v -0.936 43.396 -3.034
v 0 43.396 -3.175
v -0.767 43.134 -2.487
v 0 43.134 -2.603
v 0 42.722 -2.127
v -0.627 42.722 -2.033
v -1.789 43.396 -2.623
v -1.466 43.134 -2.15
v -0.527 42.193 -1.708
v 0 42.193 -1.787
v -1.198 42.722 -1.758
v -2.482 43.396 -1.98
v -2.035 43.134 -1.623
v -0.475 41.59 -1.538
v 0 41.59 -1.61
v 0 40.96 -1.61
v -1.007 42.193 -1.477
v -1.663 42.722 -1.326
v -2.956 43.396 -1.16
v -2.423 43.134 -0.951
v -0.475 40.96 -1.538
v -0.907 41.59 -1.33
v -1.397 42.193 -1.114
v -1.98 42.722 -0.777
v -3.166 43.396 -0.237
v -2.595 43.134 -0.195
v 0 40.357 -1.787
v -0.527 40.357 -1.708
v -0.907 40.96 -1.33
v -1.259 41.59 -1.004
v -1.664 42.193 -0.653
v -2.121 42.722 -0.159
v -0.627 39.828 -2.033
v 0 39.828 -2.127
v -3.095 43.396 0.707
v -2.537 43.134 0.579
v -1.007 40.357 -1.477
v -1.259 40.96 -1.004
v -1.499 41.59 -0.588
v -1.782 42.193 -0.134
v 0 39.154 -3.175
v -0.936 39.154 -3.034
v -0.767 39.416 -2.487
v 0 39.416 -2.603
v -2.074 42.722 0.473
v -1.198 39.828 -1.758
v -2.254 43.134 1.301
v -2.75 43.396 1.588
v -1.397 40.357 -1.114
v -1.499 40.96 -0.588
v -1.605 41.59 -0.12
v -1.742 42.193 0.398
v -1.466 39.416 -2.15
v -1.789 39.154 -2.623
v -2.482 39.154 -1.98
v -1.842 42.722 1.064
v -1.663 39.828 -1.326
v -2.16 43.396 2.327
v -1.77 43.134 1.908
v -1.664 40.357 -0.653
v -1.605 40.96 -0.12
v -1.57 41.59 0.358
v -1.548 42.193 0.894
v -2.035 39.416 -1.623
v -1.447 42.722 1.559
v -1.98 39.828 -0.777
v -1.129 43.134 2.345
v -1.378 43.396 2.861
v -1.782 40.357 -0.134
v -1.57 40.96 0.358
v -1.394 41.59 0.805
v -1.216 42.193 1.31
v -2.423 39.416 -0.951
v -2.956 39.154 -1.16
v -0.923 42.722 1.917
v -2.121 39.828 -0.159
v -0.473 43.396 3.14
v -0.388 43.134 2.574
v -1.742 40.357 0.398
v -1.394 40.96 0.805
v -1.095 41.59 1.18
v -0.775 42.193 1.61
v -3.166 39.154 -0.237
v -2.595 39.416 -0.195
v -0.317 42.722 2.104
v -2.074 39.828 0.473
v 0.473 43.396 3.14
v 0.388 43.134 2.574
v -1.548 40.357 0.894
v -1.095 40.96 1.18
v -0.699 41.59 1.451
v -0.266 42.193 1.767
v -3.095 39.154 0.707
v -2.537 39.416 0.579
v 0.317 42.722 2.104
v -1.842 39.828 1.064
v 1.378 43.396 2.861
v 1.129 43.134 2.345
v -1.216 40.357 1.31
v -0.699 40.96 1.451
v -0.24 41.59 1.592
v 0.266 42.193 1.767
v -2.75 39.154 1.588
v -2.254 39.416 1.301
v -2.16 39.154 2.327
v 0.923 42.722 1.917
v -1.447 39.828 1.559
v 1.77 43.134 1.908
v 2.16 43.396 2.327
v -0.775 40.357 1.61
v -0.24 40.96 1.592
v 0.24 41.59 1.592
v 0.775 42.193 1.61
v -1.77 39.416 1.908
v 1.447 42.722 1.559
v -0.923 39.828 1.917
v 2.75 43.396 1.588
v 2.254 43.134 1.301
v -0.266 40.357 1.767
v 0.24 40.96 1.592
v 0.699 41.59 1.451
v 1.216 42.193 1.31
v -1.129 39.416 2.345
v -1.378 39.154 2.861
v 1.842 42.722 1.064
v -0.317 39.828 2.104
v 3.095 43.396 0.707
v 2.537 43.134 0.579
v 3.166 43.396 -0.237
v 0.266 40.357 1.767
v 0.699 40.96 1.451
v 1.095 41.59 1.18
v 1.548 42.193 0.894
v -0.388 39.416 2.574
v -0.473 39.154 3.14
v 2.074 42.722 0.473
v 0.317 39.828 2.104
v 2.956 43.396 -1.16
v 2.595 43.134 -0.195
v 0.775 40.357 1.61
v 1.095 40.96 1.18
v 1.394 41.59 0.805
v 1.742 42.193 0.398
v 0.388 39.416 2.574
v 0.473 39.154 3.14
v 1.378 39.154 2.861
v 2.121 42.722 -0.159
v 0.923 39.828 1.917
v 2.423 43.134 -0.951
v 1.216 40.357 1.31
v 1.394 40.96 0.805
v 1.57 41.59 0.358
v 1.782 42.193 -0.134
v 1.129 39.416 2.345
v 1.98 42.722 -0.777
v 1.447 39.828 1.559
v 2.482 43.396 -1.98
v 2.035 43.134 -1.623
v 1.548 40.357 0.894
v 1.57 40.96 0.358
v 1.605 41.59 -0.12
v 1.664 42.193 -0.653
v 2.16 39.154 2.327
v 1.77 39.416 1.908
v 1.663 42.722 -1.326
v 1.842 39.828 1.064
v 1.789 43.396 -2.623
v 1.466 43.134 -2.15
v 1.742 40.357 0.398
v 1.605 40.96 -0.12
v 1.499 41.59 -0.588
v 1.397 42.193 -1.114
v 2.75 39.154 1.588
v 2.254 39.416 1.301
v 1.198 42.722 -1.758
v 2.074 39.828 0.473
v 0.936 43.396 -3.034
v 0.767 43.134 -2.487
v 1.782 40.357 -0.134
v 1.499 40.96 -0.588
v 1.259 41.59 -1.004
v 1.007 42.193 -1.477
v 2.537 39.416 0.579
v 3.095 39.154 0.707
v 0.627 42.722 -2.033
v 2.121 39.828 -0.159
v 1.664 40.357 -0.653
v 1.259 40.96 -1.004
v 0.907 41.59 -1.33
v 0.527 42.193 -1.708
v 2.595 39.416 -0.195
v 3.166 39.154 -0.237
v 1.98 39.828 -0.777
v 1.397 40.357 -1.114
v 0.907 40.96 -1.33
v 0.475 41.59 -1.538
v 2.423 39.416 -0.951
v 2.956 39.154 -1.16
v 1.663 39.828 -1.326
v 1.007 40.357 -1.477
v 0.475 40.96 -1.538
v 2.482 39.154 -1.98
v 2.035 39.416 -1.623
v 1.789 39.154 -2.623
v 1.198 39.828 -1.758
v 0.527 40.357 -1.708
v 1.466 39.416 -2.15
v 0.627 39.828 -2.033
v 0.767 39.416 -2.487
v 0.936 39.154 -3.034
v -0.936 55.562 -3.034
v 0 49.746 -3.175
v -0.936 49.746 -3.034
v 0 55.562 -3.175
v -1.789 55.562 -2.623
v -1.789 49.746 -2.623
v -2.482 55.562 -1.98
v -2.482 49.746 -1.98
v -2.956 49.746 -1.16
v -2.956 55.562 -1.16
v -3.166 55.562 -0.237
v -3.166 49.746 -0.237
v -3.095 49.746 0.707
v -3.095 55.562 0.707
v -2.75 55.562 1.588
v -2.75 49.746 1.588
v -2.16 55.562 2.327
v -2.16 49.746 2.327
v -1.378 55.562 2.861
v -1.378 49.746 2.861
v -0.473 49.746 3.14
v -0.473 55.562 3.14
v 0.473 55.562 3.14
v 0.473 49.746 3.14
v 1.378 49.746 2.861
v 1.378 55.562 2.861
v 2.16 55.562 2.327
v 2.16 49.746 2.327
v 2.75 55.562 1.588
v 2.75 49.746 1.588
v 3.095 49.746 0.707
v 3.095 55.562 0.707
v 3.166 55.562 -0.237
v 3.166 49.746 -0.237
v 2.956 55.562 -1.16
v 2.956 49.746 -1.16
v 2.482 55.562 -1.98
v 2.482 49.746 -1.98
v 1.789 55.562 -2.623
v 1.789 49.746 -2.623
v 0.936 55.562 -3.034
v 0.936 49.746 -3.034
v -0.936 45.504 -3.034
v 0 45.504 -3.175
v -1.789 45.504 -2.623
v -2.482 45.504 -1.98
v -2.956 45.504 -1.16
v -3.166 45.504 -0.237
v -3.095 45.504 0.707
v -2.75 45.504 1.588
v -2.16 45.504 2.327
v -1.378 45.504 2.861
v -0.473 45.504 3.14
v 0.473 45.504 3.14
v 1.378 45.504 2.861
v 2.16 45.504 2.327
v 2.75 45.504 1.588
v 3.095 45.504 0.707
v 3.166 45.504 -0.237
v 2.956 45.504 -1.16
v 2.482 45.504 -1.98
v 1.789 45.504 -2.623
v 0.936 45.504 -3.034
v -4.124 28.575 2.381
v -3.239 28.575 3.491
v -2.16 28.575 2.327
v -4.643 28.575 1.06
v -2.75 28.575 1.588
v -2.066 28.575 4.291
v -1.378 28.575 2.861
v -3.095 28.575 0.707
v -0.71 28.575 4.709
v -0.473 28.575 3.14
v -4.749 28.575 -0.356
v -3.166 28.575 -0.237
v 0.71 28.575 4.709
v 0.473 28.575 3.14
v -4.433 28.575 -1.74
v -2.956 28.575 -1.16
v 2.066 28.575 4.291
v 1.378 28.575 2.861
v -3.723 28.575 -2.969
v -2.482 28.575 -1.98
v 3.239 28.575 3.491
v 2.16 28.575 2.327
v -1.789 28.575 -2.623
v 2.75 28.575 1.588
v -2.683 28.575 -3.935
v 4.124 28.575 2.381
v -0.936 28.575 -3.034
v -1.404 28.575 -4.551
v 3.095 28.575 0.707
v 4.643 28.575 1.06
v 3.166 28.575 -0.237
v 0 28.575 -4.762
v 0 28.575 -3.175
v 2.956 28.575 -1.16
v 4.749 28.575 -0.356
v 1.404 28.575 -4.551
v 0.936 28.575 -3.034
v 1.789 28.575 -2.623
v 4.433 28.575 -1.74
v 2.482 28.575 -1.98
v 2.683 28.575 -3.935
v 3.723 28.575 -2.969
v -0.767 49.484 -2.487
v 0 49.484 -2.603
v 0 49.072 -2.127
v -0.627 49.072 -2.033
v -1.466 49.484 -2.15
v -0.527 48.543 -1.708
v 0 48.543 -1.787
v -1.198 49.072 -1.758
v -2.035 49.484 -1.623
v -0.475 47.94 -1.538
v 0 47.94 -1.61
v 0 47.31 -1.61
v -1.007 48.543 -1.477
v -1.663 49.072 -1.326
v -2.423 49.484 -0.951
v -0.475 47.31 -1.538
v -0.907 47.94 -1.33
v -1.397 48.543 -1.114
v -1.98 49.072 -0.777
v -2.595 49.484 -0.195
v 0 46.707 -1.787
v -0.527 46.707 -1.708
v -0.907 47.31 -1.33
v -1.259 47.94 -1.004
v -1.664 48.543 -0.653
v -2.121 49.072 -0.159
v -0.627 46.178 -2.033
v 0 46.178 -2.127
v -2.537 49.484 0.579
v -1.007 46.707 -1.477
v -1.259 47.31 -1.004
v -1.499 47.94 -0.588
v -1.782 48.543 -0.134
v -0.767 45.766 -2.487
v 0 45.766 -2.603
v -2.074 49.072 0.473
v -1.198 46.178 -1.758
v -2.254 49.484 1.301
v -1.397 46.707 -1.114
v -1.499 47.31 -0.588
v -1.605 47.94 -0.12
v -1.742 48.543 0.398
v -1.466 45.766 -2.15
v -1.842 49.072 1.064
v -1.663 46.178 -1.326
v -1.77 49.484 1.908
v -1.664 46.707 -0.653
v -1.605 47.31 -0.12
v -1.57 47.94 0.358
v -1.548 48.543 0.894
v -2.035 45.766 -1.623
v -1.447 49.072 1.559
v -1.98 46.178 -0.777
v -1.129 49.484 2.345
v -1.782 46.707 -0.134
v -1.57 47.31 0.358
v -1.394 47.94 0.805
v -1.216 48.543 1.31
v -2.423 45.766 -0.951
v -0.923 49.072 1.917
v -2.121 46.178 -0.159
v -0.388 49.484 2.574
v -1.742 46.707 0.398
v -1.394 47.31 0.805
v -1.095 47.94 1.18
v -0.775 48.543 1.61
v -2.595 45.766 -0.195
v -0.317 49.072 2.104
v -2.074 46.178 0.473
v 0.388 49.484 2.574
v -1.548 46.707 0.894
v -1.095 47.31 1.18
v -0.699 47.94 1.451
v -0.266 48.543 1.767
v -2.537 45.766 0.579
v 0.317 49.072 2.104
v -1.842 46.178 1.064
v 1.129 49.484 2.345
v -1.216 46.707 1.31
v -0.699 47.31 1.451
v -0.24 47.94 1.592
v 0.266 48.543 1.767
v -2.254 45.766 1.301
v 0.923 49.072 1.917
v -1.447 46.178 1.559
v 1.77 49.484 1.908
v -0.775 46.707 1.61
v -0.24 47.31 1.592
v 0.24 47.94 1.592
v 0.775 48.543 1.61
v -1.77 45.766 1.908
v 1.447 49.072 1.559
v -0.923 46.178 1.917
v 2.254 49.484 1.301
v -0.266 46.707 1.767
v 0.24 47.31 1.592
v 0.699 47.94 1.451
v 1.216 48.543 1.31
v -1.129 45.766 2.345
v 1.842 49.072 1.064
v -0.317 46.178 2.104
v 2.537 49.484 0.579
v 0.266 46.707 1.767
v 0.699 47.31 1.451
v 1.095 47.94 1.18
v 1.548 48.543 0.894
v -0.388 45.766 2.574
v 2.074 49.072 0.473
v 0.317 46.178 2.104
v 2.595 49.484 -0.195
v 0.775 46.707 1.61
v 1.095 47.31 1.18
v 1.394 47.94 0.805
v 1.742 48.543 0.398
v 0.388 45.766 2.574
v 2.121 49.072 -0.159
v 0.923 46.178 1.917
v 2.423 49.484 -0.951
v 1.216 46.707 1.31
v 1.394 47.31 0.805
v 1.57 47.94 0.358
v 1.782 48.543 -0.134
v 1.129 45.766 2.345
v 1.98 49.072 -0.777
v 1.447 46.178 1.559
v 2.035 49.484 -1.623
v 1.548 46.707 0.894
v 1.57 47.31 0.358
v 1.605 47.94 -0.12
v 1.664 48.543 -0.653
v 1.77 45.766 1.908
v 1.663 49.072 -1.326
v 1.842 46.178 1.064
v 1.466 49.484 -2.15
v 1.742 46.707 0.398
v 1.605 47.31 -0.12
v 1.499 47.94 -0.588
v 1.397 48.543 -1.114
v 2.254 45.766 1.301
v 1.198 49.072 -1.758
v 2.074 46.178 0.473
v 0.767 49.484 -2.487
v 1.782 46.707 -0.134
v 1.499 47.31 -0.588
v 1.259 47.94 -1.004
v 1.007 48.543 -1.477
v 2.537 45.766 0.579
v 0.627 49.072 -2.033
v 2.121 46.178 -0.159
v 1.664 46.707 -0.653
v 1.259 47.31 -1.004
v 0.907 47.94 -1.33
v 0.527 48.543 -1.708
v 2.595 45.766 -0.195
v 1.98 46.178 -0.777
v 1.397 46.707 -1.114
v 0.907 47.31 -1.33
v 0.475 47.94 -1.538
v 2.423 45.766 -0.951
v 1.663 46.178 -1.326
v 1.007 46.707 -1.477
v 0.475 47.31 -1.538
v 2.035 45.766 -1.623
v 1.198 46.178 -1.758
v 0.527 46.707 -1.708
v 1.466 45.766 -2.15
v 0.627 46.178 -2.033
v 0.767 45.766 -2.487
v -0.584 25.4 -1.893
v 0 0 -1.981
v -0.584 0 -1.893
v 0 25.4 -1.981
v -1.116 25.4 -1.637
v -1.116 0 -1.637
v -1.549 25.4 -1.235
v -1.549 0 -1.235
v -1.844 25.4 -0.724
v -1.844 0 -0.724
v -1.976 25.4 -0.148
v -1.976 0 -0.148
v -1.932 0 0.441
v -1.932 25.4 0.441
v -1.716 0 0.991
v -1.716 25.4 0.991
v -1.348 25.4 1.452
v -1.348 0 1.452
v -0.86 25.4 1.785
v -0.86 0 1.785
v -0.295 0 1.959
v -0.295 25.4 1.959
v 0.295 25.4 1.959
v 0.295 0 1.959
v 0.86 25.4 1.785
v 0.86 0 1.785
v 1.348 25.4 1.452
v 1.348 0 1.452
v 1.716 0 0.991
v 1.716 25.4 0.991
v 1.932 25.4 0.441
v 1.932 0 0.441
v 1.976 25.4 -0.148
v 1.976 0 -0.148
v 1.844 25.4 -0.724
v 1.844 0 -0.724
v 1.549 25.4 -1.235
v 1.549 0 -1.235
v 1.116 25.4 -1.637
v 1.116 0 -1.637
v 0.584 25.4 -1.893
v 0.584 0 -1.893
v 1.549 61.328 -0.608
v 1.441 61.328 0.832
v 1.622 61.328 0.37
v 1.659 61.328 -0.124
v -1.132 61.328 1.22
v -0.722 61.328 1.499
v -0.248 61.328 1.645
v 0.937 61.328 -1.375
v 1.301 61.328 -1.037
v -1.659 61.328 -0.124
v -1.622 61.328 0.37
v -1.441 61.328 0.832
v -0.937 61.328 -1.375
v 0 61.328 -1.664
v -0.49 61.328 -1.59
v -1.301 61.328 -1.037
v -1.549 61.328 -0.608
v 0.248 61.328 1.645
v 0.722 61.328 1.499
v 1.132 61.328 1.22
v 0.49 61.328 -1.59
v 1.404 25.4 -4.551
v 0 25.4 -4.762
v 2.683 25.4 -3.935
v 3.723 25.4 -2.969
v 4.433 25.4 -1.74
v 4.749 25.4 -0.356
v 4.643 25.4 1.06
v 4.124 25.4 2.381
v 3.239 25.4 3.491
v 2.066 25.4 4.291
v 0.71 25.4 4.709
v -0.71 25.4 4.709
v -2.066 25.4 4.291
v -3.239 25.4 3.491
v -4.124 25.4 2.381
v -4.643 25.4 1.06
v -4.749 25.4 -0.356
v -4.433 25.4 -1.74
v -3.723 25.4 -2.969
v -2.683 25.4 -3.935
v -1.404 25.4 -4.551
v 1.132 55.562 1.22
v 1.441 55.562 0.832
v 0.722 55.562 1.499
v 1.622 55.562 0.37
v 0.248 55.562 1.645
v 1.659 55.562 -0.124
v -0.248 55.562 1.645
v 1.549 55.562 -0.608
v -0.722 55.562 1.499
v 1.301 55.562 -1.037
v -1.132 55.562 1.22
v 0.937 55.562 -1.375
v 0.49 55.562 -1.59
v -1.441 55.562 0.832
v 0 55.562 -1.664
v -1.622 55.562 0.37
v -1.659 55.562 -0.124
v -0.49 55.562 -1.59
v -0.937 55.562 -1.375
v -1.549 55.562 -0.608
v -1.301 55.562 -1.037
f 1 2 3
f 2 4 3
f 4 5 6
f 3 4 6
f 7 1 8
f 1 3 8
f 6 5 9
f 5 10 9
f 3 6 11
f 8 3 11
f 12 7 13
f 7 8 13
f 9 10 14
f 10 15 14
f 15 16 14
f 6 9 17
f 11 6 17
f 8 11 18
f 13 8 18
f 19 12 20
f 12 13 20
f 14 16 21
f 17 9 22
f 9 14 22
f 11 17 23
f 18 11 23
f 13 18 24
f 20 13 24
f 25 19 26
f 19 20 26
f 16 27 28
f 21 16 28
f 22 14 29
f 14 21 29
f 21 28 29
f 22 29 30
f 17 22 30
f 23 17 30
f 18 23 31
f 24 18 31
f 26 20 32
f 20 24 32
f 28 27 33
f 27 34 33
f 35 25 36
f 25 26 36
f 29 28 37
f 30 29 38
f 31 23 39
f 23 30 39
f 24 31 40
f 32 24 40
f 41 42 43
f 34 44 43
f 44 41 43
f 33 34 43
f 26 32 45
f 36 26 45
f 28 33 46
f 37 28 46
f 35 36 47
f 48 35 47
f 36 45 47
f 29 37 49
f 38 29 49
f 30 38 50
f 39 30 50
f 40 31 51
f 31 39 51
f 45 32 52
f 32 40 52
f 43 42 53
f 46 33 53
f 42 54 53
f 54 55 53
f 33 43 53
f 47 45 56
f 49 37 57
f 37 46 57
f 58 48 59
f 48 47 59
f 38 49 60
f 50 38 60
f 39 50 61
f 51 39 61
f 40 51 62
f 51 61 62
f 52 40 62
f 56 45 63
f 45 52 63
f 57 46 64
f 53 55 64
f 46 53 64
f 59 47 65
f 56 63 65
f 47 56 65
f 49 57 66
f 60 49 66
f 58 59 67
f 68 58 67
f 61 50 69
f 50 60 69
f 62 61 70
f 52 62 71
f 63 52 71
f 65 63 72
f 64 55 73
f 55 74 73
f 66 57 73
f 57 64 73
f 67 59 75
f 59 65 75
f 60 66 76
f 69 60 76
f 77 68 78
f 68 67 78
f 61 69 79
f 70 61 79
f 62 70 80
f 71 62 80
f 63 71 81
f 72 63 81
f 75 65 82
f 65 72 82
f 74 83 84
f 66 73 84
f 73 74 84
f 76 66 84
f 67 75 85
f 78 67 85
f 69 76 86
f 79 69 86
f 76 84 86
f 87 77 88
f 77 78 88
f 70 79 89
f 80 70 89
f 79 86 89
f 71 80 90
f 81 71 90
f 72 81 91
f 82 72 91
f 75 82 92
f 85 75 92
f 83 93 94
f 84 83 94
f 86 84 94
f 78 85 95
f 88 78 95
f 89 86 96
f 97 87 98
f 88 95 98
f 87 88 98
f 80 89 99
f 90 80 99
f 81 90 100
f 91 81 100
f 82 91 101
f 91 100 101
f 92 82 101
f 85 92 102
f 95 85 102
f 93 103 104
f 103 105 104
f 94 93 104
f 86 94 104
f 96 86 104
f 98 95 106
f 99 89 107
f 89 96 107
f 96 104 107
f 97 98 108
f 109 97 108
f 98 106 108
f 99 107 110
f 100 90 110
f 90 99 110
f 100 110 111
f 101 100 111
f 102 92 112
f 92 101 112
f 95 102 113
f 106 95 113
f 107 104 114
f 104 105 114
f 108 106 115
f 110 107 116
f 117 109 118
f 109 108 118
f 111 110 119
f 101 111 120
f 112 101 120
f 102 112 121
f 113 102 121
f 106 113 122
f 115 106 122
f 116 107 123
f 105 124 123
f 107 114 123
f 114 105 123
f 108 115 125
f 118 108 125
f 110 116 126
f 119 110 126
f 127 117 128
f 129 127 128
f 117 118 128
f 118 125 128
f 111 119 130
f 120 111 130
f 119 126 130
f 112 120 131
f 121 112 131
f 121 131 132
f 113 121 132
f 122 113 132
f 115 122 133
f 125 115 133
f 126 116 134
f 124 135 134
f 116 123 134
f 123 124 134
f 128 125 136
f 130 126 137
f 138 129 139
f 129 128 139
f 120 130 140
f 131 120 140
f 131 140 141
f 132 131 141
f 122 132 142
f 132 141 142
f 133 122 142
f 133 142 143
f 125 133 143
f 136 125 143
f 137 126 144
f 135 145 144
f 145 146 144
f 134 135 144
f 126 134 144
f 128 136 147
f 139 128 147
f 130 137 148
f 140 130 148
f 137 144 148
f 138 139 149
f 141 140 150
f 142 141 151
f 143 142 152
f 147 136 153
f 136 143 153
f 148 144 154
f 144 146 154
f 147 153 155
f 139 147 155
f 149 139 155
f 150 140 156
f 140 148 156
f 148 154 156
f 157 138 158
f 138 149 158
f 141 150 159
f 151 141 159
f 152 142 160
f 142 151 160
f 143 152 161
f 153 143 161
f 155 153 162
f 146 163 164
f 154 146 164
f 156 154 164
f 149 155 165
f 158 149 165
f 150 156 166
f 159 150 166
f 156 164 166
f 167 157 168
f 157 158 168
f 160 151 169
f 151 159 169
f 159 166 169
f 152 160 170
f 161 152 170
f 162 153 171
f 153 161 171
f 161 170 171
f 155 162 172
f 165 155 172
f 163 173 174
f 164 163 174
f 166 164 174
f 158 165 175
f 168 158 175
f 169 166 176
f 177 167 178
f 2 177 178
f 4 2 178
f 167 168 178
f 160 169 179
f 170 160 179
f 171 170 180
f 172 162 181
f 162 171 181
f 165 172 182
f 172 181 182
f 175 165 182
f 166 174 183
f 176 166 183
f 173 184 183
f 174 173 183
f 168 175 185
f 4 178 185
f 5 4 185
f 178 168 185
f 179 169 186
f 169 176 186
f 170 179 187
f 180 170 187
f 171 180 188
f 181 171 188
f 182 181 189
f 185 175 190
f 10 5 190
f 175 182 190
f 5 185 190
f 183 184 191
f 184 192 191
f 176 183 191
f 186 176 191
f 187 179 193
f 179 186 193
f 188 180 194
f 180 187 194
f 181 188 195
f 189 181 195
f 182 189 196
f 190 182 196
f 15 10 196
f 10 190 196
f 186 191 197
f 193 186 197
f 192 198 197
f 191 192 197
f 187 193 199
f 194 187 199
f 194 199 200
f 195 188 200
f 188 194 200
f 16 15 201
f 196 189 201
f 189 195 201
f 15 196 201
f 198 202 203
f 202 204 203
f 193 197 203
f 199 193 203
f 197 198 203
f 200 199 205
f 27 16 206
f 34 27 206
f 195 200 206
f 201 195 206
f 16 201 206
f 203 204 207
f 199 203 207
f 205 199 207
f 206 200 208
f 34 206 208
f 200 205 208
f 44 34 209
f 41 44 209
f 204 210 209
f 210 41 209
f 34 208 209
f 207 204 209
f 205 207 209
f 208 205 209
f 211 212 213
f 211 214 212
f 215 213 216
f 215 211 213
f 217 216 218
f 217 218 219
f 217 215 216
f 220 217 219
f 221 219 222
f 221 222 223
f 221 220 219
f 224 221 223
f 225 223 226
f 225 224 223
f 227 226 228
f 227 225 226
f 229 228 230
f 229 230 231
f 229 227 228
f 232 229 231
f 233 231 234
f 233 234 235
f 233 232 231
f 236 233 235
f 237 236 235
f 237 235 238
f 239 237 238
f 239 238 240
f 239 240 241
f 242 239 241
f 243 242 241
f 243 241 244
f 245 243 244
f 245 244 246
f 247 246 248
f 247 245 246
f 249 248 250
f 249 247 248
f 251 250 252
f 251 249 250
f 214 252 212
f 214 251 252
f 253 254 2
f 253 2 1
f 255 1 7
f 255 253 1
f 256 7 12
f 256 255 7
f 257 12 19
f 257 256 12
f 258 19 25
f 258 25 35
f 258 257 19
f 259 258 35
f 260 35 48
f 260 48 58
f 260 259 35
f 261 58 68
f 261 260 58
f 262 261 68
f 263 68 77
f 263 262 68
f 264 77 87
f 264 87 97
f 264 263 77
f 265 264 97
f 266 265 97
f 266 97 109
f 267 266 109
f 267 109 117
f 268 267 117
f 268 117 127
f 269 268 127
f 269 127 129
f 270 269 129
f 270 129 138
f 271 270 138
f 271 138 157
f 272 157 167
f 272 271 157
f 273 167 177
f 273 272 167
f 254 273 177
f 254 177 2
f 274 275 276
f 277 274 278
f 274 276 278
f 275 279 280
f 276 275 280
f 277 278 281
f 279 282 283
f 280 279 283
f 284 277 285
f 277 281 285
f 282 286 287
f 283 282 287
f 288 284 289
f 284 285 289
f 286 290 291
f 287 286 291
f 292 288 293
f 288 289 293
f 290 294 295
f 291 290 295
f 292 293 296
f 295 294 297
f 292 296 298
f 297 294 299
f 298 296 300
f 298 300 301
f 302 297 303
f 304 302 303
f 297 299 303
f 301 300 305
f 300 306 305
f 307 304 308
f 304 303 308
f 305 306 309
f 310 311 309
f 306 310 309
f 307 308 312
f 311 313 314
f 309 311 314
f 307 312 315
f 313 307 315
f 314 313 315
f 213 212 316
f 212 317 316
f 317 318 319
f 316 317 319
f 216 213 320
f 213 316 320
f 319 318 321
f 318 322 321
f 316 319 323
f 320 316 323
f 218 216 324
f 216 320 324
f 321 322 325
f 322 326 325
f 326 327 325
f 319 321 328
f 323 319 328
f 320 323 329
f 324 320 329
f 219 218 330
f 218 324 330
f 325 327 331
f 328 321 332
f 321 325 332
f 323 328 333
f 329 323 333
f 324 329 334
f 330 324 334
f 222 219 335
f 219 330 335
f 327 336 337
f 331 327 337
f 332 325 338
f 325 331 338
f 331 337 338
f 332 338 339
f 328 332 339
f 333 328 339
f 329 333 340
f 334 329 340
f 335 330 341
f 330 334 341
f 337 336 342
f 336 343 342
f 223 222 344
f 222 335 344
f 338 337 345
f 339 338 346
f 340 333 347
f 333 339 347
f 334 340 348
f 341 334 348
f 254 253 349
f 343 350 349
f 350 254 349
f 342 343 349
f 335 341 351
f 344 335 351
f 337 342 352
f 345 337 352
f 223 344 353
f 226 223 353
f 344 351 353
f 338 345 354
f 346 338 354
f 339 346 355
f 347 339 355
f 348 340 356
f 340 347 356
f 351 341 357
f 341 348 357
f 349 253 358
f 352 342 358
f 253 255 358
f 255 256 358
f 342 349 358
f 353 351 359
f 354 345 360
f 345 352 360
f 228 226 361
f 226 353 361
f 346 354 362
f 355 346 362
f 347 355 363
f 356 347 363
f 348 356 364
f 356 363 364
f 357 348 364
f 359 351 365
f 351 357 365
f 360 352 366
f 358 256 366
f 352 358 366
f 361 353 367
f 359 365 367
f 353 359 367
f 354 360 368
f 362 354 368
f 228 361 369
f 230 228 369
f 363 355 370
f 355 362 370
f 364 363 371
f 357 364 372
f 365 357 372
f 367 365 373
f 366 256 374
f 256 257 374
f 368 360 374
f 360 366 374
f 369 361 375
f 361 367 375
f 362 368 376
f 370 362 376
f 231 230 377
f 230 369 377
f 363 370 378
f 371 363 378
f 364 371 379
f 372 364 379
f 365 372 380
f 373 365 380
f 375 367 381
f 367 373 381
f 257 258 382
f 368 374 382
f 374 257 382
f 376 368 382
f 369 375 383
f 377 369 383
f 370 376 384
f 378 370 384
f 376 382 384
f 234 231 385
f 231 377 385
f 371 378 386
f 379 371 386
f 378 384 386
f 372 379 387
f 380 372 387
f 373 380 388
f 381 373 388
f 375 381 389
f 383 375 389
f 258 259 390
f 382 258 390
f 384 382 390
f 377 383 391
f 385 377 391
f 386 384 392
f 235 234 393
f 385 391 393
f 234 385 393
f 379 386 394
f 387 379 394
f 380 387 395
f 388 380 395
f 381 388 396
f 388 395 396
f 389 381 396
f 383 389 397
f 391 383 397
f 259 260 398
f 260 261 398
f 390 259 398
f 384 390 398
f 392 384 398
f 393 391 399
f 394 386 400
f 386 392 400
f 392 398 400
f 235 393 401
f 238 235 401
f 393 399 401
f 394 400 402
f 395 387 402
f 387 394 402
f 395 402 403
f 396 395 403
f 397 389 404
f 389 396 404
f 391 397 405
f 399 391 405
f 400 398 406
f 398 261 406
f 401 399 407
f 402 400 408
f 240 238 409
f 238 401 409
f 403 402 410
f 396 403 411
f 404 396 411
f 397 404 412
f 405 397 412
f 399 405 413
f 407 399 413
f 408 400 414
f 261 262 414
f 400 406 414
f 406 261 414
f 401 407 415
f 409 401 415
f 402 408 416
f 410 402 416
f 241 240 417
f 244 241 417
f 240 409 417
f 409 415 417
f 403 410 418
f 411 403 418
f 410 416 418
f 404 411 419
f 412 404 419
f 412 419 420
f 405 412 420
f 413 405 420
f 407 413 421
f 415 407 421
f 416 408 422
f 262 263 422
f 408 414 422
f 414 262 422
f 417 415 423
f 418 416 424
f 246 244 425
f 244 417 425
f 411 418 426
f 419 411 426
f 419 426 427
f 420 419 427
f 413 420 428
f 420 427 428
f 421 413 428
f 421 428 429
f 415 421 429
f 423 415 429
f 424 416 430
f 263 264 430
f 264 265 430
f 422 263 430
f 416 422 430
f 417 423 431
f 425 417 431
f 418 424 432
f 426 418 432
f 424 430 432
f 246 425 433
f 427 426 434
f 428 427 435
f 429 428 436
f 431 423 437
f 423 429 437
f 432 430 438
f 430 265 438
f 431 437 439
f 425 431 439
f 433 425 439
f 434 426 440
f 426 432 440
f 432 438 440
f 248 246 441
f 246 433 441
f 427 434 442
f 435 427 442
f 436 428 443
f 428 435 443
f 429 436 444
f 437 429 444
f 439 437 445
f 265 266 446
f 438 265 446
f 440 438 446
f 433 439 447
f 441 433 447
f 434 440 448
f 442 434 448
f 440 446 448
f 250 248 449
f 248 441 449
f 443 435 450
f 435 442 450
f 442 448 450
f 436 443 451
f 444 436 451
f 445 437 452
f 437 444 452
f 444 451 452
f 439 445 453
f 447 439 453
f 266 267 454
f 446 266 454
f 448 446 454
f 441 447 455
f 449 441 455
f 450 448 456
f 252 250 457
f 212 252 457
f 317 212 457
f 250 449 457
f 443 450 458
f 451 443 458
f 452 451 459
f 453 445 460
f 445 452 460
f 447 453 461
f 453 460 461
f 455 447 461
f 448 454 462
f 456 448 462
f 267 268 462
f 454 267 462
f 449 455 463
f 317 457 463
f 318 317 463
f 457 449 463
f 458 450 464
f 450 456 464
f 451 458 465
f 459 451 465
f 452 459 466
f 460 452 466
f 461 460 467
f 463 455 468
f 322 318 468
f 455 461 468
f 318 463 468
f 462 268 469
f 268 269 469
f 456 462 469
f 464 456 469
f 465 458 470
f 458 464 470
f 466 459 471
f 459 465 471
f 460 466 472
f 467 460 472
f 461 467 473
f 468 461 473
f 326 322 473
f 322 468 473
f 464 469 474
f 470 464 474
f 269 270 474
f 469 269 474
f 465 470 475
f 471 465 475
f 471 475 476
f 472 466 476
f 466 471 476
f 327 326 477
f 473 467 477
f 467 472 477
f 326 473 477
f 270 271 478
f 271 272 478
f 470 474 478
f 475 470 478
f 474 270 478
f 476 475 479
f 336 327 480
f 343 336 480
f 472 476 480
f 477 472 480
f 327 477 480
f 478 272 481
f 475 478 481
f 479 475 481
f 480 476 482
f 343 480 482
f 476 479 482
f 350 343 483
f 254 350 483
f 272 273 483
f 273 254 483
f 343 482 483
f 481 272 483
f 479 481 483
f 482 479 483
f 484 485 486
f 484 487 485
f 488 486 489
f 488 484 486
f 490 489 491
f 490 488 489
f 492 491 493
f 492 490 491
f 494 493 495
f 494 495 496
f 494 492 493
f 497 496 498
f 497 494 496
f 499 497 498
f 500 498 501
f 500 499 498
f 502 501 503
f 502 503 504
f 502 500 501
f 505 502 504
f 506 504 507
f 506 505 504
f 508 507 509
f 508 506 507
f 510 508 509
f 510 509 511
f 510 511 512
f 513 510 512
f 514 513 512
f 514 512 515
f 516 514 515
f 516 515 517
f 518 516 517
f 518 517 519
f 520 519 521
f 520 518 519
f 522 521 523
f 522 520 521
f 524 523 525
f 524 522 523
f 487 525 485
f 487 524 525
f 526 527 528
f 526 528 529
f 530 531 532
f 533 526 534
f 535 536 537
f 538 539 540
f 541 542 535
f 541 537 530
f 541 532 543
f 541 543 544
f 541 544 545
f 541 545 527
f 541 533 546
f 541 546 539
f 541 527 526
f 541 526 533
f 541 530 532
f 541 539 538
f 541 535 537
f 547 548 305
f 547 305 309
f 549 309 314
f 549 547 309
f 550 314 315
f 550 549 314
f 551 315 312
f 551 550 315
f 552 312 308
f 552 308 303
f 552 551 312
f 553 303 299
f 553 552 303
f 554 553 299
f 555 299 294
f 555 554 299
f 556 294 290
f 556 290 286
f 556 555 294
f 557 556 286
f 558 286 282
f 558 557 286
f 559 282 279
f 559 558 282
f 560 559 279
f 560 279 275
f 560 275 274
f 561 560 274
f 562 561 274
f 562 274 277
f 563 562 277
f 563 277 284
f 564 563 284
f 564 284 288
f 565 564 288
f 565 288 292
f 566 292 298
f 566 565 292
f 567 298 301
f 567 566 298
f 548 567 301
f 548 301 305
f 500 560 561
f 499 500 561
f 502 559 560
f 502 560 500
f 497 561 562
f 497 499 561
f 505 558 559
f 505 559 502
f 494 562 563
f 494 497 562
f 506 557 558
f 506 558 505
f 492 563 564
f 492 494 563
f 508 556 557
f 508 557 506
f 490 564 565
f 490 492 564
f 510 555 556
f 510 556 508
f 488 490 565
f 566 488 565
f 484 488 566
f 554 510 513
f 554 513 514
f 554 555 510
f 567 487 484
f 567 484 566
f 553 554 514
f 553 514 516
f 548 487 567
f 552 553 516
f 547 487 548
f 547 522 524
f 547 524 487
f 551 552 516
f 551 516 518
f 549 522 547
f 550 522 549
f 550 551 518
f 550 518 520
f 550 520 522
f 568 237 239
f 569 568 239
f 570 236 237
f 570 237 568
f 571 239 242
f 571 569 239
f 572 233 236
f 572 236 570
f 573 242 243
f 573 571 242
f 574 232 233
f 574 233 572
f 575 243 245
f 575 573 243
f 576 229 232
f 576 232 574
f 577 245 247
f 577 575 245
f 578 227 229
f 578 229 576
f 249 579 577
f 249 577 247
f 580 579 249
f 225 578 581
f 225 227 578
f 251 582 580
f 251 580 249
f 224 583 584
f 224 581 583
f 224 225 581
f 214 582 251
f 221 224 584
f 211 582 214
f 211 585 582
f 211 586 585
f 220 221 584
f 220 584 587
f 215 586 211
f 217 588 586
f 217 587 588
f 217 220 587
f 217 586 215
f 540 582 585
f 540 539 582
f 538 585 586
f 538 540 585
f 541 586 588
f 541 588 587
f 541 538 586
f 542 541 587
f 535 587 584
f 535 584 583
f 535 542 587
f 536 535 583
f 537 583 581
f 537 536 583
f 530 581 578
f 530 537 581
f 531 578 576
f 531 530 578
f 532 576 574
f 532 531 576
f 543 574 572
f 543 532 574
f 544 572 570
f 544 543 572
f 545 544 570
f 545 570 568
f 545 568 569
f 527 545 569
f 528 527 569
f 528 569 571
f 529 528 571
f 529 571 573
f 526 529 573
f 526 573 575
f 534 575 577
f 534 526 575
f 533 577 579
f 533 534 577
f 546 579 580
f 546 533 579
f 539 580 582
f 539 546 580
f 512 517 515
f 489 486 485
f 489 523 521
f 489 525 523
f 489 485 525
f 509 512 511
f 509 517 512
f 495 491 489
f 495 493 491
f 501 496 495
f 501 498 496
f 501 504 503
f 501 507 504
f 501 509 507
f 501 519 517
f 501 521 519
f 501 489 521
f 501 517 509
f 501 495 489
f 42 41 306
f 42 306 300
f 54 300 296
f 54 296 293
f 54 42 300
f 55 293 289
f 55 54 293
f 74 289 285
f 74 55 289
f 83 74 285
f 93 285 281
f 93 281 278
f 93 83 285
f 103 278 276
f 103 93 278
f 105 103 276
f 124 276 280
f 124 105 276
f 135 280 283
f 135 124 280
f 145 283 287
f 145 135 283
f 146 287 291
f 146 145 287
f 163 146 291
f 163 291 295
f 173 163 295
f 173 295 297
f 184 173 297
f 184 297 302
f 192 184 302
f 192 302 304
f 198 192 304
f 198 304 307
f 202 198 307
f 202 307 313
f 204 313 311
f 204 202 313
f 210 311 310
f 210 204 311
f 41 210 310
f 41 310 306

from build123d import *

# Parameters (mm, degrees)
SKETCH2_R           = 4.7625
BOSS_EXTRUDE1_DEPTH = 3.175
LPATTERN1_COUNT     = 2
LPATTERN1_PITCH     = 6.35


with BuildPart() as part:
    # Sketch1 → Revolve1 (revolve)
    with BuildSketch(Plane.XY, mode=Mode.PRIVATE) as revolve1_sk:
        Polygon((0, 0), (1.9812, 0), (1.9812, 25.4), (3.175, 25.4), (3.175, 55.5625), (1.6637, 55.5625), (1.6637, 61.3283), (0, 61.3283), align=None)
    revolve(revolve1_sk.sketch.rotate(Axis((0, 0, 0), (0, 1, 0)), 90), axis=Axis((0, 0, 0), (0, 1, 0)))  # turned: the seam where the file's is

    # Sketch2 → Boss-Extrude1 (add)
    with BuildSketch(Plane.XZ.offset(-25.4)):
        with Locations(Location((0, 0, 0), (0, 0, 270))):  # turned: the seam where the file's is
            Circle(SKETCH2_R)
    extrude(amount=-BOSS_EXTRUDE1_DEPTH)

    # Sketch4 → Cut-Revolve1 (revolve, cut)
    with BuildSketch(Plane(origin=(0, 0, 0), x_dir=(0, 0, -1), z_dir=(1, 0, 0))):
        with BuildLine():
            Line((3.175, 39.1541), (3.175, 43.3959))
            ThreePointArc((3.175, 43.3959), (1.5875, 41.275), (3.175, 39.1541))
        make_face()
    cut_revolve1 = revolve(axis=Axis((0, 0, 0), (0, 1, 0)), mode=Mode.SUBTRACT)

    # LPattern1: Cut-Revolve1 ×2
    with Locations(*[(0, i * LPATTERN1_PITCH, 0) for i in range(1, LPATTERN1_COUNT)]):
        add(cut_revolve1, mode=Mode.SUBTRACT)


solid = part.part
